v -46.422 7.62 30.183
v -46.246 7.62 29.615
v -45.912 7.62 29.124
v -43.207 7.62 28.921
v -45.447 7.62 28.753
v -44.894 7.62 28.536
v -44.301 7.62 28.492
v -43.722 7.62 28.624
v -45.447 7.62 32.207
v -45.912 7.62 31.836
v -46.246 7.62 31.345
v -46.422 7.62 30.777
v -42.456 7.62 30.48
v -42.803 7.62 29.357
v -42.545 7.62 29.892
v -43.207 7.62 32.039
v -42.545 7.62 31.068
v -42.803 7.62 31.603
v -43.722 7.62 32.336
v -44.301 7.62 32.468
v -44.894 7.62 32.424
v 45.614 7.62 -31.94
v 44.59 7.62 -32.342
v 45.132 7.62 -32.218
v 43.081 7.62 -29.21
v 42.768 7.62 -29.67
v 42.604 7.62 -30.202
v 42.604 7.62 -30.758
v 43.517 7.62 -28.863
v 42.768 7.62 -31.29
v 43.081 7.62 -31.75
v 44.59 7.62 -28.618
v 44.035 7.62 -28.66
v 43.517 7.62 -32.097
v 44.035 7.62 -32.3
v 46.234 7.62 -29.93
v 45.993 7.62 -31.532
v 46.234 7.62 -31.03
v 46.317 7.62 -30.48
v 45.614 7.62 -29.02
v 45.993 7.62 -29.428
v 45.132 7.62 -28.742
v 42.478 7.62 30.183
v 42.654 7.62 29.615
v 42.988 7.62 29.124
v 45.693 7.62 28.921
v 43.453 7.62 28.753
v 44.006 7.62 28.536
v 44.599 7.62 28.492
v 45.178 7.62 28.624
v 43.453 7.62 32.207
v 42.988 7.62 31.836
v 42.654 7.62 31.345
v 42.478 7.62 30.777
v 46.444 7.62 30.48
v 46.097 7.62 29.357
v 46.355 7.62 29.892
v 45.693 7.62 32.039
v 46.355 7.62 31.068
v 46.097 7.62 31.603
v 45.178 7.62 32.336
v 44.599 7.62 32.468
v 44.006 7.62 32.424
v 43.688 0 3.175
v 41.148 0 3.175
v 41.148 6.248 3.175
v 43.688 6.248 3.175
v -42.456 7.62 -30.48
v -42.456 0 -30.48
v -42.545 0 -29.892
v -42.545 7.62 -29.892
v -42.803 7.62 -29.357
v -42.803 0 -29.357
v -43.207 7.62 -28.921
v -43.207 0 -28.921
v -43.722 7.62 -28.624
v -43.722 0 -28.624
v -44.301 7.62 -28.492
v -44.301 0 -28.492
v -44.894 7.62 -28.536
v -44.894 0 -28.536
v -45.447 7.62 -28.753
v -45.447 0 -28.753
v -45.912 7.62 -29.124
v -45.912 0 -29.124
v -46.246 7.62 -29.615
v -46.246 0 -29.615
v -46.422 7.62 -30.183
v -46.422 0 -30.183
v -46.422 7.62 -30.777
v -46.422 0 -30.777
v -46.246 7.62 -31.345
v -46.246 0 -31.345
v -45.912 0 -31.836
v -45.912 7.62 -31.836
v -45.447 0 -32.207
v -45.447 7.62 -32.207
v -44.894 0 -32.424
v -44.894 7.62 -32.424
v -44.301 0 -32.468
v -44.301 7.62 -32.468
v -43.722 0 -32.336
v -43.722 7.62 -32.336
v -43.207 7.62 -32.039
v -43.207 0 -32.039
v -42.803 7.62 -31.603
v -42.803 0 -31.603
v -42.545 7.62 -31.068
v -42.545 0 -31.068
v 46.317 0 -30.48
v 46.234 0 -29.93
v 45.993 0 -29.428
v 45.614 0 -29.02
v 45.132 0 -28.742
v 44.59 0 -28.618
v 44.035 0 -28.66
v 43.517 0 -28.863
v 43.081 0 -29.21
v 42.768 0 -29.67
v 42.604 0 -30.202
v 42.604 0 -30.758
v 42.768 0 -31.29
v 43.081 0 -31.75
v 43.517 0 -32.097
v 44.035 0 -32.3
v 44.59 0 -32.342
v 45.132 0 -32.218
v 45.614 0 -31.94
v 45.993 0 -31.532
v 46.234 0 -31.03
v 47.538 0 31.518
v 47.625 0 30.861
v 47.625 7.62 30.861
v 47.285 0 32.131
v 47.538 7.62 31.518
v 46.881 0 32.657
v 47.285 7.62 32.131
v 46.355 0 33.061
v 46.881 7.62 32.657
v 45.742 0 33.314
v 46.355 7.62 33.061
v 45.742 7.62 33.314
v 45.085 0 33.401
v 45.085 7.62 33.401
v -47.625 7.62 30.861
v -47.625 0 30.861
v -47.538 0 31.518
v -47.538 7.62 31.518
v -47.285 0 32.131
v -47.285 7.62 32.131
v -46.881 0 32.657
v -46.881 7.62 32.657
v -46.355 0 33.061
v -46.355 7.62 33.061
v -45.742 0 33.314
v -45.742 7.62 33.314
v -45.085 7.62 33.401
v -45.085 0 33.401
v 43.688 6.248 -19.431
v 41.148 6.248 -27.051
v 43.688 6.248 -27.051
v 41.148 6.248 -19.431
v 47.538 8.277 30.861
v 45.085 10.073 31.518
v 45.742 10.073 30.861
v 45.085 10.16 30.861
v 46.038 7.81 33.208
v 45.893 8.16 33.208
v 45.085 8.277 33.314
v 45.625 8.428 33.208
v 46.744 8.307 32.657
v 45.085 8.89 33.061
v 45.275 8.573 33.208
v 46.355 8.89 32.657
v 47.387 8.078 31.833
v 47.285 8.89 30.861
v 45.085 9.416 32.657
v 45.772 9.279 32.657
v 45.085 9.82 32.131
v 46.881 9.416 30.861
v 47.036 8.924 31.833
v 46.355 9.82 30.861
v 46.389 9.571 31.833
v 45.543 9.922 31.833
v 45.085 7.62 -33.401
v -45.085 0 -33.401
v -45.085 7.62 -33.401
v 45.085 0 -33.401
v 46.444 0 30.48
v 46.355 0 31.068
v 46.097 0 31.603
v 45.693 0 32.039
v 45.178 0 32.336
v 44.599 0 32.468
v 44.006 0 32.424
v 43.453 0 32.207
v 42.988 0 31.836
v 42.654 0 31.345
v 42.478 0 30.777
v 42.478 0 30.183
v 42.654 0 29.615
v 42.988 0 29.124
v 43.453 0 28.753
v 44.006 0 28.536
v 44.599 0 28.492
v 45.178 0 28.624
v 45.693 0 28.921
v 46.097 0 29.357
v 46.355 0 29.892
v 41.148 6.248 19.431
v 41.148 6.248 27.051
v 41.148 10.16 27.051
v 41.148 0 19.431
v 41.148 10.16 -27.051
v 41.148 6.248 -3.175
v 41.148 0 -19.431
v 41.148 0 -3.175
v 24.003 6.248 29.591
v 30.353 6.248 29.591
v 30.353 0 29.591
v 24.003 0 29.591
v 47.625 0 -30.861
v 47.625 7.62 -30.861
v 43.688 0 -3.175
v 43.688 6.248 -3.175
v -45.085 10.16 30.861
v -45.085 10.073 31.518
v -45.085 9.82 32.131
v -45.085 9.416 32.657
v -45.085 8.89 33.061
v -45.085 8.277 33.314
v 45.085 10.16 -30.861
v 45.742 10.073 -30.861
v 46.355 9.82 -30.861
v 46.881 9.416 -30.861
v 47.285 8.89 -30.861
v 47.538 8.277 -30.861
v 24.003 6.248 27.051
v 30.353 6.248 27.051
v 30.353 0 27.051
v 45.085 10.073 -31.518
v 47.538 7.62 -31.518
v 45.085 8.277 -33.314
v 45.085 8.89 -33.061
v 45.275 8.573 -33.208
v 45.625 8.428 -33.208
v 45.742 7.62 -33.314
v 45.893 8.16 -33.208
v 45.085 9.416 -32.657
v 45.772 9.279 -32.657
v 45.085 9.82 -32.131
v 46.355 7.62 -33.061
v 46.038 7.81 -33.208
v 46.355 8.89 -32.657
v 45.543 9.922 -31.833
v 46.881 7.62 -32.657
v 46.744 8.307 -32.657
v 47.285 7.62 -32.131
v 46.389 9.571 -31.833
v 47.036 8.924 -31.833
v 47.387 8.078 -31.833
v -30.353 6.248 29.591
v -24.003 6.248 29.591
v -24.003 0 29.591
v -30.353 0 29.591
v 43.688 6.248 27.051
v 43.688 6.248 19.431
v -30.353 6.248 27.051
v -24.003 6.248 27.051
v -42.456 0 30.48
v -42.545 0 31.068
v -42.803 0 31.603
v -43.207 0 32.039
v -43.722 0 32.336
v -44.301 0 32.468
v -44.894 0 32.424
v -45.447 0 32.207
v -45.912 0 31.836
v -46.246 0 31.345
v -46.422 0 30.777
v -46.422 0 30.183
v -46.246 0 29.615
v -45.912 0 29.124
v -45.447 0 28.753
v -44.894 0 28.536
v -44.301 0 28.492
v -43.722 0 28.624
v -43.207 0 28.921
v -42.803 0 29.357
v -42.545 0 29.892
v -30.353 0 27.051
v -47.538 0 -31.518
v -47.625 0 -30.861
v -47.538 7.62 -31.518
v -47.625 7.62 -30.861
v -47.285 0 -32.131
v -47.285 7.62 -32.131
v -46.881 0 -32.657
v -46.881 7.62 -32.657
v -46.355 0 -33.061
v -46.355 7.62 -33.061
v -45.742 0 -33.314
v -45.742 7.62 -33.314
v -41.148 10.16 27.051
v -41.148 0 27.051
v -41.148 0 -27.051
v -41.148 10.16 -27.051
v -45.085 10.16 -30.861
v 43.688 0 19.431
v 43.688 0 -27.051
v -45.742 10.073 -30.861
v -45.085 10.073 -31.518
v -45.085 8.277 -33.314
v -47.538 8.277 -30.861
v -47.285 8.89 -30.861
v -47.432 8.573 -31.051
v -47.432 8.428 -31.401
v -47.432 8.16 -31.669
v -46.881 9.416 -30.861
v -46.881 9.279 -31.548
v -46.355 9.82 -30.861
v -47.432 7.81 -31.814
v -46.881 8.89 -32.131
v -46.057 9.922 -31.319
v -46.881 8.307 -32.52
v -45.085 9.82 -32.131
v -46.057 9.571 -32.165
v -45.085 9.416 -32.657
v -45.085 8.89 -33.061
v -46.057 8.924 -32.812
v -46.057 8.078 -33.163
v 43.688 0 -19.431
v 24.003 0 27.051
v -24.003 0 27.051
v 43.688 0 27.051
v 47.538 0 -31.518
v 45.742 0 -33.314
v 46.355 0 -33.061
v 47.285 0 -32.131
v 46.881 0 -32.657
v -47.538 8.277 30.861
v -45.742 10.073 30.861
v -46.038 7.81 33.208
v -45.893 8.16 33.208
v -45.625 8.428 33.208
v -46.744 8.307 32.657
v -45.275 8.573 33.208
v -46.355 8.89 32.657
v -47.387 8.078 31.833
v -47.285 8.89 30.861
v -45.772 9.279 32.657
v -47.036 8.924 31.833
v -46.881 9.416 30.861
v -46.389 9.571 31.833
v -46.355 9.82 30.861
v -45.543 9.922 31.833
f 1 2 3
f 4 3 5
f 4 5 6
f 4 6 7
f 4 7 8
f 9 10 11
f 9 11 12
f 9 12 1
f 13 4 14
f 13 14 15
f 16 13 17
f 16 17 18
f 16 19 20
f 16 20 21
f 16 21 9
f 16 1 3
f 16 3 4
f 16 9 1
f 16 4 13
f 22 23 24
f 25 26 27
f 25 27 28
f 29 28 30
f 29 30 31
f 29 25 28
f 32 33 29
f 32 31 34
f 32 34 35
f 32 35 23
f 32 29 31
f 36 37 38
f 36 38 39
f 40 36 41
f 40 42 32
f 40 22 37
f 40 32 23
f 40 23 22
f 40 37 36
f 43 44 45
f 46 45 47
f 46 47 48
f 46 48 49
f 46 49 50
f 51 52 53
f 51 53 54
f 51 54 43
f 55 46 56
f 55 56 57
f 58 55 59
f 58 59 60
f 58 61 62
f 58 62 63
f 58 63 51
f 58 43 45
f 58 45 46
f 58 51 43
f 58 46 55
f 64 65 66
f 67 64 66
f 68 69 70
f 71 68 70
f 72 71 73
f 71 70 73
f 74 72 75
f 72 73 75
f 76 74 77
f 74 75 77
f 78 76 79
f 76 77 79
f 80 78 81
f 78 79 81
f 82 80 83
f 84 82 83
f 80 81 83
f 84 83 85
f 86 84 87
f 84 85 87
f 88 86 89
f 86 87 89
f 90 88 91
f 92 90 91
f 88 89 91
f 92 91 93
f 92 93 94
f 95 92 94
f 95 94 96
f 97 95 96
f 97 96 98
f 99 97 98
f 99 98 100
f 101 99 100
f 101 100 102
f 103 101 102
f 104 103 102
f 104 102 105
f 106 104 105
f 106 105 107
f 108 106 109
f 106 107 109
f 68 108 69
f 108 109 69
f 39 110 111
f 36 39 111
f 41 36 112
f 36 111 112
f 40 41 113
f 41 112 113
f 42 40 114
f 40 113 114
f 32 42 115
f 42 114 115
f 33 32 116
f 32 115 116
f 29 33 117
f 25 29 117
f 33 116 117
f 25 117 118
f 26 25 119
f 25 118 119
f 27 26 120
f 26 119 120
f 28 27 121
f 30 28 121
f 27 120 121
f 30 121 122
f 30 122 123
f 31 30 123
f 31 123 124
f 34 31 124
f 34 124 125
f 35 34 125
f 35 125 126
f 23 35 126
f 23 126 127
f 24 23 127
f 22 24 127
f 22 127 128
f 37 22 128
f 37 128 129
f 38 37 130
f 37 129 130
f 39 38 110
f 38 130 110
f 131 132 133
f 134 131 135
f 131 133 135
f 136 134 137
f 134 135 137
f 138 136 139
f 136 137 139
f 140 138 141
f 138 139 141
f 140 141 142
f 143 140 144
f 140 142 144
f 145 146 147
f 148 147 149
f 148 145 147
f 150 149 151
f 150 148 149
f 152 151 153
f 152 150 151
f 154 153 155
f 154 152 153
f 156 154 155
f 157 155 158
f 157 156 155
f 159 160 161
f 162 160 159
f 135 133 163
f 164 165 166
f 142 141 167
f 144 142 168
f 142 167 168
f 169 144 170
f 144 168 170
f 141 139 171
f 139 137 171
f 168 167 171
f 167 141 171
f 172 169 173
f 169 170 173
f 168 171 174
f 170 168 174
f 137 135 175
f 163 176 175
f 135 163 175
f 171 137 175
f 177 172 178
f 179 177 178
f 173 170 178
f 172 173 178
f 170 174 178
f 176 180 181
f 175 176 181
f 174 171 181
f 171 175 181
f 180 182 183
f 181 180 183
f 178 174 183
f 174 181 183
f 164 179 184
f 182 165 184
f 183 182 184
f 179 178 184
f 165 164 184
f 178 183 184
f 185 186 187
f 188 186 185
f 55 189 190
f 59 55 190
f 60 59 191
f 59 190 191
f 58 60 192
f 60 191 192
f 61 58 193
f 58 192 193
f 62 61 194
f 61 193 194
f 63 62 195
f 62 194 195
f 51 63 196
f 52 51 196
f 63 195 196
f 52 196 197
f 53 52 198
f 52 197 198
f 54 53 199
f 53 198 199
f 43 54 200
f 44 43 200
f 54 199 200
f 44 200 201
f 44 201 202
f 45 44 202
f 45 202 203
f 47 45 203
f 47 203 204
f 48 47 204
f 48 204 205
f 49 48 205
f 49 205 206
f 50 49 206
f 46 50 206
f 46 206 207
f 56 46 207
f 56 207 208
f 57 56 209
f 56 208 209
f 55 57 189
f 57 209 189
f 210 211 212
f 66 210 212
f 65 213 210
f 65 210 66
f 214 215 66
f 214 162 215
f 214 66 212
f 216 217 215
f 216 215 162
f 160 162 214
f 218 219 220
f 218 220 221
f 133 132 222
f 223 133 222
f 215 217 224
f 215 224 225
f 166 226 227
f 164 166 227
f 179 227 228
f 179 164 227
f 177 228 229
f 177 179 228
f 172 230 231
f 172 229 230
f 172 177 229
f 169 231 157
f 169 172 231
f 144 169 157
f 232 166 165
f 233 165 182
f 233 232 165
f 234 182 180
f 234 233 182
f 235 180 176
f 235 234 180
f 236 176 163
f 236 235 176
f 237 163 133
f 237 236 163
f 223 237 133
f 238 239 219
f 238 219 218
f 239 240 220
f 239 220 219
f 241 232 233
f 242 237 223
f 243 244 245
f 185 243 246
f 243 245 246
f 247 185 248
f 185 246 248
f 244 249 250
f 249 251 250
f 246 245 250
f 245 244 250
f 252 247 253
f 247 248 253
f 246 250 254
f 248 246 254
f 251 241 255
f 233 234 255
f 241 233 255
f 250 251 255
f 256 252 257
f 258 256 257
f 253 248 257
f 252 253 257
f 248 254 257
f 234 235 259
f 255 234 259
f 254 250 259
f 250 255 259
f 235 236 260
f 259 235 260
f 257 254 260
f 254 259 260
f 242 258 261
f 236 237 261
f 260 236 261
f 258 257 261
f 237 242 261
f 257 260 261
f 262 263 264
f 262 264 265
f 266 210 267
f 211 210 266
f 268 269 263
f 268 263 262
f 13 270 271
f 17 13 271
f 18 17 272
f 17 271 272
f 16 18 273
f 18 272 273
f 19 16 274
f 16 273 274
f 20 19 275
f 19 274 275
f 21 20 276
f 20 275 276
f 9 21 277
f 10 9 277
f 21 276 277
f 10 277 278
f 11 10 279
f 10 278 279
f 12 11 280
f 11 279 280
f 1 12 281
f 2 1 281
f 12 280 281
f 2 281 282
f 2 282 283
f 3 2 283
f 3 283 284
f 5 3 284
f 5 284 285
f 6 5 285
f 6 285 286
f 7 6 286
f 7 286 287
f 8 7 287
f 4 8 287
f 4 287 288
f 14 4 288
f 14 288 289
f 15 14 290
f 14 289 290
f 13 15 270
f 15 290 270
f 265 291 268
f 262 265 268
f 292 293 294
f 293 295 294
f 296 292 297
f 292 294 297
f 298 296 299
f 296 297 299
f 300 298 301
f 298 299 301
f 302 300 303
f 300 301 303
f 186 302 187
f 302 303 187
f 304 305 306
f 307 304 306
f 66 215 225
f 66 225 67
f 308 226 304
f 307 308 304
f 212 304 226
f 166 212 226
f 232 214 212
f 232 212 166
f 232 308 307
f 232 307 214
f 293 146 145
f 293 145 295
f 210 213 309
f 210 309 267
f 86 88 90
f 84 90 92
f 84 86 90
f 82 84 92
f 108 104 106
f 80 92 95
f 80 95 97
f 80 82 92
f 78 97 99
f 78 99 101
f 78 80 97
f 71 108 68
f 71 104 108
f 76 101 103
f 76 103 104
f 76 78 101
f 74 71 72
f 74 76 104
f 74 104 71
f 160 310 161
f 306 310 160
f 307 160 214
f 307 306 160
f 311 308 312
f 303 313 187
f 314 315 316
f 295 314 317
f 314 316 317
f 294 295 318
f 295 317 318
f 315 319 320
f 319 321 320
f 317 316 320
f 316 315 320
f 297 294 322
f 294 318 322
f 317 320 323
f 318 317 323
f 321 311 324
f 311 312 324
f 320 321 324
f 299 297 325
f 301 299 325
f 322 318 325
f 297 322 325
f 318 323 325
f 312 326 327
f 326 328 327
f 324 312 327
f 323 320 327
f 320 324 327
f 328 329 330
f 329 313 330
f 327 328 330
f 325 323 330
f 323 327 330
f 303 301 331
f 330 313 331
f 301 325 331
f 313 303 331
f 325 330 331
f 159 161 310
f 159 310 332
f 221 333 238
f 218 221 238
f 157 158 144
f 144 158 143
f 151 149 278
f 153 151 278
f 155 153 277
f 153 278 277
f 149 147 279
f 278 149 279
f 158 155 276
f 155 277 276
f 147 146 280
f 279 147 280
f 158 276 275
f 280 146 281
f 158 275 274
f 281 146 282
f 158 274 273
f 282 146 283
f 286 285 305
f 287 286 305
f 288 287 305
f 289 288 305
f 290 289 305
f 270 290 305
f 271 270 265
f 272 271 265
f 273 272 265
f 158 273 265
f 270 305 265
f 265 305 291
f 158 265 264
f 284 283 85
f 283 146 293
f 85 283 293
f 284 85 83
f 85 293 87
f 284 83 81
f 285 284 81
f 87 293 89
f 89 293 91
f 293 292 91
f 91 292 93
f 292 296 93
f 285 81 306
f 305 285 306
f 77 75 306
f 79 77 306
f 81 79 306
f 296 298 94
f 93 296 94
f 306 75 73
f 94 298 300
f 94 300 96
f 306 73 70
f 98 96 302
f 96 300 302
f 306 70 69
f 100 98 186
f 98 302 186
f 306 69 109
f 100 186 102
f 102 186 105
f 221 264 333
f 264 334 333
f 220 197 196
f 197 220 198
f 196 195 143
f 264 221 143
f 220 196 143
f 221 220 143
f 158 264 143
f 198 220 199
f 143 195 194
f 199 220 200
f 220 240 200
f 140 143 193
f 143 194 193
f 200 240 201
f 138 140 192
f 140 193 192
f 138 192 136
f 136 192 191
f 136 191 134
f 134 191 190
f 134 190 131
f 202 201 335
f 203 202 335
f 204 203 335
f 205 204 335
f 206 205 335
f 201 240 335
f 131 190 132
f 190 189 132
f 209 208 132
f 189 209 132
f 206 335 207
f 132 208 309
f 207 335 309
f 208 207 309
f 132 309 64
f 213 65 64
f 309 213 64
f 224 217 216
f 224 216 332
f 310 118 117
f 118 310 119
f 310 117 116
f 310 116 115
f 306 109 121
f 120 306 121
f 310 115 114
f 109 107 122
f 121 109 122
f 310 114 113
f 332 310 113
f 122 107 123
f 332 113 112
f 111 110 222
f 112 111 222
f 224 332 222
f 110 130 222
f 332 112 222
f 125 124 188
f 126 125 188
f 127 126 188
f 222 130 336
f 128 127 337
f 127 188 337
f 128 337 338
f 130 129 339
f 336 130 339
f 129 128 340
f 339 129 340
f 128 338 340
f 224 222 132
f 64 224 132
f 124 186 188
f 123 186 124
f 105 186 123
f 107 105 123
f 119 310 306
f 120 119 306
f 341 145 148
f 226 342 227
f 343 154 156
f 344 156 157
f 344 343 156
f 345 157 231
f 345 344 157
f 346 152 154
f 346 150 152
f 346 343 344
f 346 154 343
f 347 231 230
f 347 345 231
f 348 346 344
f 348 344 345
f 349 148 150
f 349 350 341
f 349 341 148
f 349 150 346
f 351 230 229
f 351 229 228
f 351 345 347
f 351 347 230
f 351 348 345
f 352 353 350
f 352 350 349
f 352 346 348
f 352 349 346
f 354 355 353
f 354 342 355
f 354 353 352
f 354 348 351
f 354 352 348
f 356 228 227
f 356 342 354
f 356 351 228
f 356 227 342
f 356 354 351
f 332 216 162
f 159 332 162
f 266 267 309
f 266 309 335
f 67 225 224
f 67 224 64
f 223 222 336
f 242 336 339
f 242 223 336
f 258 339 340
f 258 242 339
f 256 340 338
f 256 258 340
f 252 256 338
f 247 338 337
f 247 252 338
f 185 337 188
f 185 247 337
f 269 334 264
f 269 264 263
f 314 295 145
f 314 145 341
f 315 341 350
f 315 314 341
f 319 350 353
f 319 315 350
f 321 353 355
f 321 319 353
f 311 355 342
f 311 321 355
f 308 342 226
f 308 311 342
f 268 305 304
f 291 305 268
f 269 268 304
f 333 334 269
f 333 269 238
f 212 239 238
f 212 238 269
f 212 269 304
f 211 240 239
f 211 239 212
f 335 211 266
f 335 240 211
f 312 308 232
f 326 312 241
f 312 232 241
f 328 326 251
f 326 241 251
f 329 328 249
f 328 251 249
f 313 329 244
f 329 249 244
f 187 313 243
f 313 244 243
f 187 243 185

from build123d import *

# Parameters (mm, degrees)
SKETCH2_W           = 95.25
SKETCH2_H           = 66.802
SKETCH2_W_2         = 82.296
SKETCH2_H_2         = 54.102
BOSS_EXTRUDE1_DEPTH = 10.16
SKETCH3_R           = 1.9939
SKETCH3_R_2         = 1.8669
CUT_EXTRUDE1_DEPTH  = 7.62
SKETCH4_W           = 6.35
SKETCH4_H           = 6.2484
CUT_EXTRUDE2_DEPTH  = 2.54
SKETCH6_W           = 7.62
SKETCH6_H           = 6.2484
SKETCH6_W_2         = 6.35
CUT_EXTRUDE3_DEPTH  = 2.54
FILLET1_R           = 2.54


with BuildPart() as part:
    # Sketch2 → Boss-Extrude1 (new body)
    with BuildSketch(Plane(origin=(0, 0, 0), x_dir=(1, 0, 0), z_dir=(0, 1, 0))):
        Rectangle(SKETCH2_W, SKETCH2_H)
        Rectangle(SKETCH2_W_2, SKETCH2_H_2, mode=Mode.SUBTRACT)
    extrude(amount=BOSS_EXTRUDE1_DEPTH)

    # Sketch3 → Cut-Extrude1 (cut)
    with BuildSketch(Plane.XZ):
        with Locations((-44.45, 30.48)):
            Circle(SKETCH3_R)
        with Locations((44.45, 30.48)):
            Circle(SKETCH3_R)
        with Locations((44.45, -30.48)):
            Circle(SKETCH3_R_2)
        with Locations((-44.45, -30.48)):
            Circle(SKETCH3_R)
    extrude(amount=-CUT_EXTRUDE1_DEPTH, mode=Mode.SUBTRACT)

    # Sketch4 → Cut-Extrude2 (cut)
    with BuildSketch(Plane(origin=(0, 0, 27.051), x_dir=(-1, 0, 0), z_dir=(0, 0, -1))):
        with Locations((27.178, 3.1242)):
            Rectangle(SKETCH4_W, SKETCH4_H)
        with Locations((-27.178, 3.1242)):
            Rectangle(SKETCH4_W, SKETCH4_H)
    extrude(amount=-CUT_EXTRUDE2_DEPTH, mode=Mode.SUBTRACT)

    # Sketch6 → Cut-Extrude3 (cut)
    with BuildSketch(Plane.ZY.offset(-41.148)):
        with Locations((-23.241, 3.1242)):
            Rectangle(SKETCH6_W, SKETCH6_H)
        with Locations((23.241, 3.1242)):
            Rectangle(SKETCH6_W, SKETCH6_H)
        with Locations((0, 3.1242)):
            Rectangle(SKETCH6_W_2, SKETCH6_H)
    extrude(amount=-CUT_EXTRUDE3_DEPTH, mode=Mode.SUBTRACT)

    # Fillet1
    fillet1_edges = [part.edges().sort_by_distance(p)[0] for p in [
        (47.625, 10.16, 0),
        (0, 10.16, -33.401),
        (-47.625, 10.16, 0),
        (-47.625, 5.08, -33.401),
        (47.625, 5.08, -33.401),
        (47.625, 5.08, 33.401),
        (-47.625, 5.08, 33.401),
        (0, 10.16, 33.401),
    ]]
    fillet(fillet1_edges, radius=FILLET1_R)


solid = part.part
